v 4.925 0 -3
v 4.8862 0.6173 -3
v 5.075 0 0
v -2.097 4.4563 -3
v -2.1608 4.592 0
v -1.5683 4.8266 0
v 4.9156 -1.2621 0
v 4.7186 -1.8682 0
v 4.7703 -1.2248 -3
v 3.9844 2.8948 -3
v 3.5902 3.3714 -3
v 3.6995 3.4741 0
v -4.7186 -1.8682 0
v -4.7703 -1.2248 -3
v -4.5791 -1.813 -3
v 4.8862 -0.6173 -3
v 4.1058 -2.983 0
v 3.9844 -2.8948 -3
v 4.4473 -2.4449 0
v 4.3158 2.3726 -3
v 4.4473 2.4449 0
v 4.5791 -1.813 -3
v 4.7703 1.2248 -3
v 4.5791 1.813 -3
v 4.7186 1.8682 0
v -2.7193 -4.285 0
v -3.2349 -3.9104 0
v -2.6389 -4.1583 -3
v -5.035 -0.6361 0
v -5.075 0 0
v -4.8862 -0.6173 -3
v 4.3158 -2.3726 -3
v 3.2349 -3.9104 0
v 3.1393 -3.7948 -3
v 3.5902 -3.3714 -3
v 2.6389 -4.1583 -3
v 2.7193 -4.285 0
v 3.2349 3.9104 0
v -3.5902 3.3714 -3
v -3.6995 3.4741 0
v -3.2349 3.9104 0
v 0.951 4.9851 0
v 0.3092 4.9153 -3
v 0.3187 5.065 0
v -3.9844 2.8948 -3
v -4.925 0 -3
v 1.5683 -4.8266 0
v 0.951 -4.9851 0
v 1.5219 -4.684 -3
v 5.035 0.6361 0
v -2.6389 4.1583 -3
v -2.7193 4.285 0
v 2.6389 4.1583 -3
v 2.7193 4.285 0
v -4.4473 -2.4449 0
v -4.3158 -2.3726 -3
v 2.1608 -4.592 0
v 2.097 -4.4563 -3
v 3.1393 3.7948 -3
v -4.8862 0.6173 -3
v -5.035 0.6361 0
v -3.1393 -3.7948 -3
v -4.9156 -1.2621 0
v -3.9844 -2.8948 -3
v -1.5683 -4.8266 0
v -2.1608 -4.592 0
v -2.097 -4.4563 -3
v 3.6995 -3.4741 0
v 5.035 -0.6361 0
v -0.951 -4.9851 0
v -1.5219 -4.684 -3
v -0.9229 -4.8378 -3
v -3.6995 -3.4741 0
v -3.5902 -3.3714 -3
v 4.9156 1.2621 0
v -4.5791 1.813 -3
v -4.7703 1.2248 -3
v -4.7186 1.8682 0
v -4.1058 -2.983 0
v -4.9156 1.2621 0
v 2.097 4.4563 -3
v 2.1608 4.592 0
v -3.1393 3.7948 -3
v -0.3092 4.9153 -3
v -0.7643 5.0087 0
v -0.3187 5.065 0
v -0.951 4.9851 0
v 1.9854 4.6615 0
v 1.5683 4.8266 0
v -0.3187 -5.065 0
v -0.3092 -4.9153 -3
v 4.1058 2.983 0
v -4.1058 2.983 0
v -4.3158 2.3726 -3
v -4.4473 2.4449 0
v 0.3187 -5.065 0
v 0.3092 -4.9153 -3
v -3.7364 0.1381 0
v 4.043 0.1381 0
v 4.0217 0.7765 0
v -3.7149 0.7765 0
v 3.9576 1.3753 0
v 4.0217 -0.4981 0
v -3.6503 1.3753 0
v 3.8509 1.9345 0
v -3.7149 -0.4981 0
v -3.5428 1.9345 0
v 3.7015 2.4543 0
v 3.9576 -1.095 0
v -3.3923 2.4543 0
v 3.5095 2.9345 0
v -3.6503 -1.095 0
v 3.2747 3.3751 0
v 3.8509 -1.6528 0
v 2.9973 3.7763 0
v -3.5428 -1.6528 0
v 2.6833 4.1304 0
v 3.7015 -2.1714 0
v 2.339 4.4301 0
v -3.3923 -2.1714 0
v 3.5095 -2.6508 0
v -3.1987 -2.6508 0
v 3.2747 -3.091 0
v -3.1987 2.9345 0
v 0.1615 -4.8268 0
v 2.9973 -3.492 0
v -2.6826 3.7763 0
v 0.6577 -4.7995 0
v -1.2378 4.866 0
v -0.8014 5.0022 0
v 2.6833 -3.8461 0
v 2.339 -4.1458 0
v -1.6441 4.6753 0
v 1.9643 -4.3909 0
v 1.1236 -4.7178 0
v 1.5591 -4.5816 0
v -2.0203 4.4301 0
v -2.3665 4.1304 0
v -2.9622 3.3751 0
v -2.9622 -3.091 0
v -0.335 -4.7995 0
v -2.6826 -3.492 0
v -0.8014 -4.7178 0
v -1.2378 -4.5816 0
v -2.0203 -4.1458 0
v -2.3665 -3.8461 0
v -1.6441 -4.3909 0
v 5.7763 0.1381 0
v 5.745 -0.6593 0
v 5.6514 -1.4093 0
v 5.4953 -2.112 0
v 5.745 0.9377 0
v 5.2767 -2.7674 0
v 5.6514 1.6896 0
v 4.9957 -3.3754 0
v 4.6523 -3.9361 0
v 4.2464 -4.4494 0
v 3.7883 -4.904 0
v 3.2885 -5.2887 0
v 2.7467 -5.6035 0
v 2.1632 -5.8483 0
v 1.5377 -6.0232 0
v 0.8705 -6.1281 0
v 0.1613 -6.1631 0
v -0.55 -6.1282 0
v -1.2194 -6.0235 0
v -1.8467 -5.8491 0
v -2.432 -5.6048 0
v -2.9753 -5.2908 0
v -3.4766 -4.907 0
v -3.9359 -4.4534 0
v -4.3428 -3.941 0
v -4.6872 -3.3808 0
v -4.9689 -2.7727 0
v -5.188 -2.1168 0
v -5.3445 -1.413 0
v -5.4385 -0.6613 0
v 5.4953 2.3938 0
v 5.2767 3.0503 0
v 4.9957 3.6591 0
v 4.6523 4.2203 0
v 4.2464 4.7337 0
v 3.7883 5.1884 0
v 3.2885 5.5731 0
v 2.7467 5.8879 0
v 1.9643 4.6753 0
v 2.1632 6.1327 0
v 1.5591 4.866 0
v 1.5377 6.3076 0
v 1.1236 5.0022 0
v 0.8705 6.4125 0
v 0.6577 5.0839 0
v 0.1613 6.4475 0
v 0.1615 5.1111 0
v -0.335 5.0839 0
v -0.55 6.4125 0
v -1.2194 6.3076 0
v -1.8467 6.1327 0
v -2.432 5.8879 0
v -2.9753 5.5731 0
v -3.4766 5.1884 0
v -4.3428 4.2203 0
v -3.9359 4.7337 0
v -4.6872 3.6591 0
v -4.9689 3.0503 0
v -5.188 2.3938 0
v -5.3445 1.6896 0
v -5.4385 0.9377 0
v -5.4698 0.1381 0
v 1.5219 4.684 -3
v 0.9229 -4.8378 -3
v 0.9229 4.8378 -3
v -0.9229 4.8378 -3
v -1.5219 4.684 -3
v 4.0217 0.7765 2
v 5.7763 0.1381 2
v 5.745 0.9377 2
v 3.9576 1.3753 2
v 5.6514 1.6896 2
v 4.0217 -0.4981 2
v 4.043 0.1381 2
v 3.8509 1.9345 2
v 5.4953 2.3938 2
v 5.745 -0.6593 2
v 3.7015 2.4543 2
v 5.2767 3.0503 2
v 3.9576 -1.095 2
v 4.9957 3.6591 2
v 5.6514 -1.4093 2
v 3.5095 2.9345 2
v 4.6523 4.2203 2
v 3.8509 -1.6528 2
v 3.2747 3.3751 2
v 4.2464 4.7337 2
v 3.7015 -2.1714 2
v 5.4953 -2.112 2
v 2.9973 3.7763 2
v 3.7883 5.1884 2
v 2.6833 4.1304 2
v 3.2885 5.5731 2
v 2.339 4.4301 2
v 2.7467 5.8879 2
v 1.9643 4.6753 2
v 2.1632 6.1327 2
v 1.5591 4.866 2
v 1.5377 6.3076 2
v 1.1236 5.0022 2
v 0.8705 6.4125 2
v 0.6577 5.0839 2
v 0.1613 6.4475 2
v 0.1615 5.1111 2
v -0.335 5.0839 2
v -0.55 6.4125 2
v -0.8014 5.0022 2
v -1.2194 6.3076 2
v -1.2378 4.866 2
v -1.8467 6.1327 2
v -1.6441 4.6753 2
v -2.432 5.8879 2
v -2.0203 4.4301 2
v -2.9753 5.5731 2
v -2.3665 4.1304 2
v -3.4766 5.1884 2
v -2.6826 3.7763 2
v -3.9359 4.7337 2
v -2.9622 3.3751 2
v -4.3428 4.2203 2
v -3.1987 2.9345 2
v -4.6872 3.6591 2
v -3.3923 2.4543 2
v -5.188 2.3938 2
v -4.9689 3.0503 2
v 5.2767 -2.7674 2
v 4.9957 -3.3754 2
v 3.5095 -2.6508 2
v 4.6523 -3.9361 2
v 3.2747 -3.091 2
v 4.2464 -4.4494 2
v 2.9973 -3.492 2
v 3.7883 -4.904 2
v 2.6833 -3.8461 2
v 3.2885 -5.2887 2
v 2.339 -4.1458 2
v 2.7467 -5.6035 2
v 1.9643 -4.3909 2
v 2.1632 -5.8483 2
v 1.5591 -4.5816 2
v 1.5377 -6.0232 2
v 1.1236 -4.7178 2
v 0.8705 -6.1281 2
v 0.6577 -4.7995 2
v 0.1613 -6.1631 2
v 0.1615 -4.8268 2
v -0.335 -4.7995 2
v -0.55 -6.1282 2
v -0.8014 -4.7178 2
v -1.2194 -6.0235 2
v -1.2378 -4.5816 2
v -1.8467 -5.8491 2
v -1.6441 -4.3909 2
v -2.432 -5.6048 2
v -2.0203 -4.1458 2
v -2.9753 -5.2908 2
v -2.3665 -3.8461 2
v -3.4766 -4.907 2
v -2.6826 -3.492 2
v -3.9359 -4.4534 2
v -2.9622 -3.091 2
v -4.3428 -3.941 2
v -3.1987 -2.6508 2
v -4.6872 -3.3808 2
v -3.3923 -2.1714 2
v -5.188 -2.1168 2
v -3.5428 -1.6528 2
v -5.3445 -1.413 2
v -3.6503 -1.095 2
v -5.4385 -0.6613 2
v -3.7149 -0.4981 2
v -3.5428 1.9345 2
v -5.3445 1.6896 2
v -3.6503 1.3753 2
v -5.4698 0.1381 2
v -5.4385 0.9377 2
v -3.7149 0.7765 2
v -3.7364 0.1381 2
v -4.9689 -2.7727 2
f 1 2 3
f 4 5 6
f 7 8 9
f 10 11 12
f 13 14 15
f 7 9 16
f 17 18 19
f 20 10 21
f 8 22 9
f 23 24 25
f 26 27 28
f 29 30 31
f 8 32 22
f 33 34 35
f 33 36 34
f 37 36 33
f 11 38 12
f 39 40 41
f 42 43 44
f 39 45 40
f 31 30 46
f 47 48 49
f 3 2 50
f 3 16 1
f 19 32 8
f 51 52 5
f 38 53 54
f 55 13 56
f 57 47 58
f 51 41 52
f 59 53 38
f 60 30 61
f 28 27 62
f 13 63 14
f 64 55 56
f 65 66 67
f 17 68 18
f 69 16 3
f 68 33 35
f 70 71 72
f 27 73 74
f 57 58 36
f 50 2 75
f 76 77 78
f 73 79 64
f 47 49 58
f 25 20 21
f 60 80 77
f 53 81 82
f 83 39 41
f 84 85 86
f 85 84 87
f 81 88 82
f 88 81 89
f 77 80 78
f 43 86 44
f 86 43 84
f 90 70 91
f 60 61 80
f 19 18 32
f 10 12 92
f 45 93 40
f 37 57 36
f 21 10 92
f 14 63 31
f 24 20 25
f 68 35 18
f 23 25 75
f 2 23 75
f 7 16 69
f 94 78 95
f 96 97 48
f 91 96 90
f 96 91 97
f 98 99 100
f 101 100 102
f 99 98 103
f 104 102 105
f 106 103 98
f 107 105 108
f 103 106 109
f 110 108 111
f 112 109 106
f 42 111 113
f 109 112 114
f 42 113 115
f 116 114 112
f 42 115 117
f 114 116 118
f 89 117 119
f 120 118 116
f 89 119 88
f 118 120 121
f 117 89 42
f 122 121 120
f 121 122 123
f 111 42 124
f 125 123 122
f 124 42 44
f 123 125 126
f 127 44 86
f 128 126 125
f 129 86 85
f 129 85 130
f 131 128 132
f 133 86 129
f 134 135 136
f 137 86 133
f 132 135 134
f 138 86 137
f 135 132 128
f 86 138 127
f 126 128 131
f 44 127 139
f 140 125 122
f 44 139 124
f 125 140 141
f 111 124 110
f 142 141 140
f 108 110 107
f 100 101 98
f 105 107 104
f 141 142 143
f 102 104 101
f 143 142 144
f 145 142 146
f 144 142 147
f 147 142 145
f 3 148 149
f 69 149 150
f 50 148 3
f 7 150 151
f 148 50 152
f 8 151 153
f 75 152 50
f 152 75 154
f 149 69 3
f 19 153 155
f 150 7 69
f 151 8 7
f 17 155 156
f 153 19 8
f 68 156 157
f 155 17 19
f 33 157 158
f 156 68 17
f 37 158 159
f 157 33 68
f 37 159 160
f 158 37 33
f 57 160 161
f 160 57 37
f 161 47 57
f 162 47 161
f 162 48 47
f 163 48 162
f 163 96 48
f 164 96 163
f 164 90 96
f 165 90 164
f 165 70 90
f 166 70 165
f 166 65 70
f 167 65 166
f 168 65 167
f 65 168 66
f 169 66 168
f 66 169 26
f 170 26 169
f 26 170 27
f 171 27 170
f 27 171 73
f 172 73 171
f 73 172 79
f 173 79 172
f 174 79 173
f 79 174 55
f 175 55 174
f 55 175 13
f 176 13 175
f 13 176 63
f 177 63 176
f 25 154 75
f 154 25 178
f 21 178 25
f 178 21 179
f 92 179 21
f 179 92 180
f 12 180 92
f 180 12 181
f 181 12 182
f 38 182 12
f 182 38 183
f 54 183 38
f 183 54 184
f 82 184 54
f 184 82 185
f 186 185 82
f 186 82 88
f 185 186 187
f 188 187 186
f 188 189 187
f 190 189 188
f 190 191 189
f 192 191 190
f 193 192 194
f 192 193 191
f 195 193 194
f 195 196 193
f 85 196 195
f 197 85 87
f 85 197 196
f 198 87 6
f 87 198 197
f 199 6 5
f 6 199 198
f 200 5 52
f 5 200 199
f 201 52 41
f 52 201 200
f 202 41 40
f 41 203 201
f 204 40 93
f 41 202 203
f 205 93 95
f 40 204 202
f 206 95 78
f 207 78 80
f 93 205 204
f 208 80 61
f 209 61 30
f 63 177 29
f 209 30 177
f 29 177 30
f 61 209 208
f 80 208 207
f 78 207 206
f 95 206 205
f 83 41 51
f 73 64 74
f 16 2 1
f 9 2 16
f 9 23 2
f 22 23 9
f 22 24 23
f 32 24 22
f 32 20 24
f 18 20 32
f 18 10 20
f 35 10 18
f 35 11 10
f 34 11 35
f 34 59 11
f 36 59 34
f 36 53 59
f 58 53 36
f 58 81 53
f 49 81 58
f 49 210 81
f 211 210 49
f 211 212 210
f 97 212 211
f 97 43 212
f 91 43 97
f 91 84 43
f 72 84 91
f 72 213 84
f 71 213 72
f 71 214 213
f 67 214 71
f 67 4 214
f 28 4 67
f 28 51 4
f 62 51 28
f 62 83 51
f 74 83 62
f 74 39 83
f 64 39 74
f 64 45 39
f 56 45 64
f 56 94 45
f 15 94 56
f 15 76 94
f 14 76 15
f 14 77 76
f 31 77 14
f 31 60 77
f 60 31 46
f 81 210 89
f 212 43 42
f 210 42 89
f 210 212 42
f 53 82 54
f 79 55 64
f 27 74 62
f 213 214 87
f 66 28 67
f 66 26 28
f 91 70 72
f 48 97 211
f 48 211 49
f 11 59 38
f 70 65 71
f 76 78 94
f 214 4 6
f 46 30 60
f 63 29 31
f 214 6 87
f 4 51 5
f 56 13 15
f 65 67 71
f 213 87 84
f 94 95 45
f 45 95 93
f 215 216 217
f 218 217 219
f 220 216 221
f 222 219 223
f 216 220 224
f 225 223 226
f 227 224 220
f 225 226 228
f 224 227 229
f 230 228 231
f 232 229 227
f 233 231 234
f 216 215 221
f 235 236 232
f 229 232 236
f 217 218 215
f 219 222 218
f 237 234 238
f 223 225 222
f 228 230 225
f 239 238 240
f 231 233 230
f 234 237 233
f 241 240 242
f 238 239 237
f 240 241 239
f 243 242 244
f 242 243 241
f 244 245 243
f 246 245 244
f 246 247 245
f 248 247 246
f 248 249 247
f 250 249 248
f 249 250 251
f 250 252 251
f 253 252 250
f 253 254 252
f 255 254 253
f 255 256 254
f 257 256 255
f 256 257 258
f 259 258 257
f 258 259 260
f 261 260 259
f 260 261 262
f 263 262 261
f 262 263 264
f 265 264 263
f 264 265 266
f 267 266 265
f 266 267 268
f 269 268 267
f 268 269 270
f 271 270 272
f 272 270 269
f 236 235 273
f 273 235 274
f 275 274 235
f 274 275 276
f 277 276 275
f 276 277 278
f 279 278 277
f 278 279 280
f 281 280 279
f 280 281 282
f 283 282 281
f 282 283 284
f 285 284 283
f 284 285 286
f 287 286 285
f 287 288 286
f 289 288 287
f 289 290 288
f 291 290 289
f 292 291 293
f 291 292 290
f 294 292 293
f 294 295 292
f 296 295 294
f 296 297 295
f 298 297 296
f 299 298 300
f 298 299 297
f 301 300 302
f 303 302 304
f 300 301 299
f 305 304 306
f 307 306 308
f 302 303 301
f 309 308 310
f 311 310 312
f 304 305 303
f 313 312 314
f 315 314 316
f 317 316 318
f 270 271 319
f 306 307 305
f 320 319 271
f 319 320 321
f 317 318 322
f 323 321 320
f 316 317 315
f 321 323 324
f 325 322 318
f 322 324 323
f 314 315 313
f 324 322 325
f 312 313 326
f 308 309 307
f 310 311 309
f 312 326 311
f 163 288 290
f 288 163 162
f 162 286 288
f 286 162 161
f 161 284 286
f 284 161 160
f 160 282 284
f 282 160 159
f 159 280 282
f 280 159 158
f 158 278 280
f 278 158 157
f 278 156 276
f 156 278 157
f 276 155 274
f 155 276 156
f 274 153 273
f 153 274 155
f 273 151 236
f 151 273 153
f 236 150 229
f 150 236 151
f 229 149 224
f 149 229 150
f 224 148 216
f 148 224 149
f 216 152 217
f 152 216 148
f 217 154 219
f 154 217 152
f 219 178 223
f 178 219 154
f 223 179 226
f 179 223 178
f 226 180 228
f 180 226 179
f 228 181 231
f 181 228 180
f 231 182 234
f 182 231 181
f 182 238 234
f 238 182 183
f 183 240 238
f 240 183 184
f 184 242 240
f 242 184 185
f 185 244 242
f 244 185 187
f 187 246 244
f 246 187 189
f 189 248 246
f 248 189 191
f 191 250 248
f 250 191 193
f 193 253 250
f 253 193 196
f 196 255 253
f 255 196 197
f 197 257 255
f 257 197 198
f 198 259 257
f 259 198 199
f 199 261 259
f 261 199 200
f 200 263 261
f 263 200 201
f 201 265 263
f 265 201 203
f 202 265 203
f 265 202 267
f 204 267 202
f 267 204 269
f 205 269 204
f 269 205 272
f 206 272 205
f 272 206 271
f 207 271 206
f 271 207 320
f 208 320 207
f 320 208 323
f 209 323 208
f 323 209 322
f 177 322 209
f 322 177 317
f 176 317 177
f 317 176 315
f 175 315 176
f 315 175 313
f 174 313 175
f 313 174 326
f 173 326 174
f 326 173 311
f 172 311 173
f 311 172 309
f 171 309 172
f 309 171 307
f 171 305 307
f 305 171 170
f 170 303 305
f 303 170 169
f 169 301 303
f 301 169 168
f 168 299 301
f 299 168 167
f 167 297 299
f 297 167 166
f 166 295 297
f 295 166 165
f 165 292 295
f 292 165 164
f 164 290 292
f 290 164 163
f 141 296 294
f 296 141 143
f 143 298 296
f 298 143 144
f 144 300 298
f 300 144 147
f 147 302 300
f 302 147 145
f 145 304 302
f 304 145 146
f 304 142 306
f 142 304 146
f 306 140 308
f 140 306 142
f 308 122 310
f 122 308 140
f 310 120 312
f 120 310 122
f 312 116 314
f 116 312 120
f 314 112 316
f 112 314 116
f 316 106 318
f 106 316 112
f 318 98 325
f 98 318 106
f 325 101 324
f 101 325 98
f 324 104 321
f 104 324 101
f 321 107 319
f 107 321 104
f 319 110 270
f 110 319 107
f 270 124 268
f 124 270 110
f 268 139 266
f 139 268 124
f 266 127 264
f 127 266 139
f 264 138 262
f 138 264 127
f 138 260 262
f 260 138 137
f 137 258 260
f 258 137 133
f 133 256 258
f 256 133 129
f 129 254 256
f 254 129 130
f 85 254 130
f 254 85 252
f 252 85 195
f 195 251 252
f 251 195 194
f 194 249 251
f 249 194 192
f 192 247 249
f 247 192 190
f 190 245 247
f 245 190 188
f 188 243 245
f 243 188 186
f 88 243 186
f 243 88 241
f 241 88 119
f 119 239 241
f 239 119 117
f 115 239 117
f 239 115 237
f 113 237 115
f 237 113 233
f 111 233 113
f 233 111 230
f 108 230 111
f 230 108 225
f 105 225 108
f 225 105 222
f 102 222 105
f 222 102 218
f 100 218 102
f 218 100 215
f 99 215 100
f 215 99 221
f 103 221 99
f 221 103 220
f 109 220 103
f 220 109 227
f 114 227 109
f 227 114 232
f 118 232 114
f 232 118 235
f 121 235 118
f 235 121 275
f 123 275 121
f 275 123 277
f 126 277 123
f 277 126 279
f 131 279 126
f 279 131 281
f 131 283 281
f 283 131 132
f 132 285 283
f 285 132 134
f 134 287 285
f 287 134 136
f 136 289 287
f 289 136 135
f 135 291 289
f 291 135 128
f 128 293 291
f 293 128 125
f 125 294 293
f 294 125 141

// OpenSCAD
$fn = 50;

difference() {
	union() {
		translate(v = [0, 0, -3.0]) {
			cylinder(h = 3, r1 = 4.925, r2 = 5.075);
		}
		linear_extrude(height = 2) {
			text(font = "Impact", halign = "center", size = 12, text = "O", valign = "center");
		}
	}
	union();
}
